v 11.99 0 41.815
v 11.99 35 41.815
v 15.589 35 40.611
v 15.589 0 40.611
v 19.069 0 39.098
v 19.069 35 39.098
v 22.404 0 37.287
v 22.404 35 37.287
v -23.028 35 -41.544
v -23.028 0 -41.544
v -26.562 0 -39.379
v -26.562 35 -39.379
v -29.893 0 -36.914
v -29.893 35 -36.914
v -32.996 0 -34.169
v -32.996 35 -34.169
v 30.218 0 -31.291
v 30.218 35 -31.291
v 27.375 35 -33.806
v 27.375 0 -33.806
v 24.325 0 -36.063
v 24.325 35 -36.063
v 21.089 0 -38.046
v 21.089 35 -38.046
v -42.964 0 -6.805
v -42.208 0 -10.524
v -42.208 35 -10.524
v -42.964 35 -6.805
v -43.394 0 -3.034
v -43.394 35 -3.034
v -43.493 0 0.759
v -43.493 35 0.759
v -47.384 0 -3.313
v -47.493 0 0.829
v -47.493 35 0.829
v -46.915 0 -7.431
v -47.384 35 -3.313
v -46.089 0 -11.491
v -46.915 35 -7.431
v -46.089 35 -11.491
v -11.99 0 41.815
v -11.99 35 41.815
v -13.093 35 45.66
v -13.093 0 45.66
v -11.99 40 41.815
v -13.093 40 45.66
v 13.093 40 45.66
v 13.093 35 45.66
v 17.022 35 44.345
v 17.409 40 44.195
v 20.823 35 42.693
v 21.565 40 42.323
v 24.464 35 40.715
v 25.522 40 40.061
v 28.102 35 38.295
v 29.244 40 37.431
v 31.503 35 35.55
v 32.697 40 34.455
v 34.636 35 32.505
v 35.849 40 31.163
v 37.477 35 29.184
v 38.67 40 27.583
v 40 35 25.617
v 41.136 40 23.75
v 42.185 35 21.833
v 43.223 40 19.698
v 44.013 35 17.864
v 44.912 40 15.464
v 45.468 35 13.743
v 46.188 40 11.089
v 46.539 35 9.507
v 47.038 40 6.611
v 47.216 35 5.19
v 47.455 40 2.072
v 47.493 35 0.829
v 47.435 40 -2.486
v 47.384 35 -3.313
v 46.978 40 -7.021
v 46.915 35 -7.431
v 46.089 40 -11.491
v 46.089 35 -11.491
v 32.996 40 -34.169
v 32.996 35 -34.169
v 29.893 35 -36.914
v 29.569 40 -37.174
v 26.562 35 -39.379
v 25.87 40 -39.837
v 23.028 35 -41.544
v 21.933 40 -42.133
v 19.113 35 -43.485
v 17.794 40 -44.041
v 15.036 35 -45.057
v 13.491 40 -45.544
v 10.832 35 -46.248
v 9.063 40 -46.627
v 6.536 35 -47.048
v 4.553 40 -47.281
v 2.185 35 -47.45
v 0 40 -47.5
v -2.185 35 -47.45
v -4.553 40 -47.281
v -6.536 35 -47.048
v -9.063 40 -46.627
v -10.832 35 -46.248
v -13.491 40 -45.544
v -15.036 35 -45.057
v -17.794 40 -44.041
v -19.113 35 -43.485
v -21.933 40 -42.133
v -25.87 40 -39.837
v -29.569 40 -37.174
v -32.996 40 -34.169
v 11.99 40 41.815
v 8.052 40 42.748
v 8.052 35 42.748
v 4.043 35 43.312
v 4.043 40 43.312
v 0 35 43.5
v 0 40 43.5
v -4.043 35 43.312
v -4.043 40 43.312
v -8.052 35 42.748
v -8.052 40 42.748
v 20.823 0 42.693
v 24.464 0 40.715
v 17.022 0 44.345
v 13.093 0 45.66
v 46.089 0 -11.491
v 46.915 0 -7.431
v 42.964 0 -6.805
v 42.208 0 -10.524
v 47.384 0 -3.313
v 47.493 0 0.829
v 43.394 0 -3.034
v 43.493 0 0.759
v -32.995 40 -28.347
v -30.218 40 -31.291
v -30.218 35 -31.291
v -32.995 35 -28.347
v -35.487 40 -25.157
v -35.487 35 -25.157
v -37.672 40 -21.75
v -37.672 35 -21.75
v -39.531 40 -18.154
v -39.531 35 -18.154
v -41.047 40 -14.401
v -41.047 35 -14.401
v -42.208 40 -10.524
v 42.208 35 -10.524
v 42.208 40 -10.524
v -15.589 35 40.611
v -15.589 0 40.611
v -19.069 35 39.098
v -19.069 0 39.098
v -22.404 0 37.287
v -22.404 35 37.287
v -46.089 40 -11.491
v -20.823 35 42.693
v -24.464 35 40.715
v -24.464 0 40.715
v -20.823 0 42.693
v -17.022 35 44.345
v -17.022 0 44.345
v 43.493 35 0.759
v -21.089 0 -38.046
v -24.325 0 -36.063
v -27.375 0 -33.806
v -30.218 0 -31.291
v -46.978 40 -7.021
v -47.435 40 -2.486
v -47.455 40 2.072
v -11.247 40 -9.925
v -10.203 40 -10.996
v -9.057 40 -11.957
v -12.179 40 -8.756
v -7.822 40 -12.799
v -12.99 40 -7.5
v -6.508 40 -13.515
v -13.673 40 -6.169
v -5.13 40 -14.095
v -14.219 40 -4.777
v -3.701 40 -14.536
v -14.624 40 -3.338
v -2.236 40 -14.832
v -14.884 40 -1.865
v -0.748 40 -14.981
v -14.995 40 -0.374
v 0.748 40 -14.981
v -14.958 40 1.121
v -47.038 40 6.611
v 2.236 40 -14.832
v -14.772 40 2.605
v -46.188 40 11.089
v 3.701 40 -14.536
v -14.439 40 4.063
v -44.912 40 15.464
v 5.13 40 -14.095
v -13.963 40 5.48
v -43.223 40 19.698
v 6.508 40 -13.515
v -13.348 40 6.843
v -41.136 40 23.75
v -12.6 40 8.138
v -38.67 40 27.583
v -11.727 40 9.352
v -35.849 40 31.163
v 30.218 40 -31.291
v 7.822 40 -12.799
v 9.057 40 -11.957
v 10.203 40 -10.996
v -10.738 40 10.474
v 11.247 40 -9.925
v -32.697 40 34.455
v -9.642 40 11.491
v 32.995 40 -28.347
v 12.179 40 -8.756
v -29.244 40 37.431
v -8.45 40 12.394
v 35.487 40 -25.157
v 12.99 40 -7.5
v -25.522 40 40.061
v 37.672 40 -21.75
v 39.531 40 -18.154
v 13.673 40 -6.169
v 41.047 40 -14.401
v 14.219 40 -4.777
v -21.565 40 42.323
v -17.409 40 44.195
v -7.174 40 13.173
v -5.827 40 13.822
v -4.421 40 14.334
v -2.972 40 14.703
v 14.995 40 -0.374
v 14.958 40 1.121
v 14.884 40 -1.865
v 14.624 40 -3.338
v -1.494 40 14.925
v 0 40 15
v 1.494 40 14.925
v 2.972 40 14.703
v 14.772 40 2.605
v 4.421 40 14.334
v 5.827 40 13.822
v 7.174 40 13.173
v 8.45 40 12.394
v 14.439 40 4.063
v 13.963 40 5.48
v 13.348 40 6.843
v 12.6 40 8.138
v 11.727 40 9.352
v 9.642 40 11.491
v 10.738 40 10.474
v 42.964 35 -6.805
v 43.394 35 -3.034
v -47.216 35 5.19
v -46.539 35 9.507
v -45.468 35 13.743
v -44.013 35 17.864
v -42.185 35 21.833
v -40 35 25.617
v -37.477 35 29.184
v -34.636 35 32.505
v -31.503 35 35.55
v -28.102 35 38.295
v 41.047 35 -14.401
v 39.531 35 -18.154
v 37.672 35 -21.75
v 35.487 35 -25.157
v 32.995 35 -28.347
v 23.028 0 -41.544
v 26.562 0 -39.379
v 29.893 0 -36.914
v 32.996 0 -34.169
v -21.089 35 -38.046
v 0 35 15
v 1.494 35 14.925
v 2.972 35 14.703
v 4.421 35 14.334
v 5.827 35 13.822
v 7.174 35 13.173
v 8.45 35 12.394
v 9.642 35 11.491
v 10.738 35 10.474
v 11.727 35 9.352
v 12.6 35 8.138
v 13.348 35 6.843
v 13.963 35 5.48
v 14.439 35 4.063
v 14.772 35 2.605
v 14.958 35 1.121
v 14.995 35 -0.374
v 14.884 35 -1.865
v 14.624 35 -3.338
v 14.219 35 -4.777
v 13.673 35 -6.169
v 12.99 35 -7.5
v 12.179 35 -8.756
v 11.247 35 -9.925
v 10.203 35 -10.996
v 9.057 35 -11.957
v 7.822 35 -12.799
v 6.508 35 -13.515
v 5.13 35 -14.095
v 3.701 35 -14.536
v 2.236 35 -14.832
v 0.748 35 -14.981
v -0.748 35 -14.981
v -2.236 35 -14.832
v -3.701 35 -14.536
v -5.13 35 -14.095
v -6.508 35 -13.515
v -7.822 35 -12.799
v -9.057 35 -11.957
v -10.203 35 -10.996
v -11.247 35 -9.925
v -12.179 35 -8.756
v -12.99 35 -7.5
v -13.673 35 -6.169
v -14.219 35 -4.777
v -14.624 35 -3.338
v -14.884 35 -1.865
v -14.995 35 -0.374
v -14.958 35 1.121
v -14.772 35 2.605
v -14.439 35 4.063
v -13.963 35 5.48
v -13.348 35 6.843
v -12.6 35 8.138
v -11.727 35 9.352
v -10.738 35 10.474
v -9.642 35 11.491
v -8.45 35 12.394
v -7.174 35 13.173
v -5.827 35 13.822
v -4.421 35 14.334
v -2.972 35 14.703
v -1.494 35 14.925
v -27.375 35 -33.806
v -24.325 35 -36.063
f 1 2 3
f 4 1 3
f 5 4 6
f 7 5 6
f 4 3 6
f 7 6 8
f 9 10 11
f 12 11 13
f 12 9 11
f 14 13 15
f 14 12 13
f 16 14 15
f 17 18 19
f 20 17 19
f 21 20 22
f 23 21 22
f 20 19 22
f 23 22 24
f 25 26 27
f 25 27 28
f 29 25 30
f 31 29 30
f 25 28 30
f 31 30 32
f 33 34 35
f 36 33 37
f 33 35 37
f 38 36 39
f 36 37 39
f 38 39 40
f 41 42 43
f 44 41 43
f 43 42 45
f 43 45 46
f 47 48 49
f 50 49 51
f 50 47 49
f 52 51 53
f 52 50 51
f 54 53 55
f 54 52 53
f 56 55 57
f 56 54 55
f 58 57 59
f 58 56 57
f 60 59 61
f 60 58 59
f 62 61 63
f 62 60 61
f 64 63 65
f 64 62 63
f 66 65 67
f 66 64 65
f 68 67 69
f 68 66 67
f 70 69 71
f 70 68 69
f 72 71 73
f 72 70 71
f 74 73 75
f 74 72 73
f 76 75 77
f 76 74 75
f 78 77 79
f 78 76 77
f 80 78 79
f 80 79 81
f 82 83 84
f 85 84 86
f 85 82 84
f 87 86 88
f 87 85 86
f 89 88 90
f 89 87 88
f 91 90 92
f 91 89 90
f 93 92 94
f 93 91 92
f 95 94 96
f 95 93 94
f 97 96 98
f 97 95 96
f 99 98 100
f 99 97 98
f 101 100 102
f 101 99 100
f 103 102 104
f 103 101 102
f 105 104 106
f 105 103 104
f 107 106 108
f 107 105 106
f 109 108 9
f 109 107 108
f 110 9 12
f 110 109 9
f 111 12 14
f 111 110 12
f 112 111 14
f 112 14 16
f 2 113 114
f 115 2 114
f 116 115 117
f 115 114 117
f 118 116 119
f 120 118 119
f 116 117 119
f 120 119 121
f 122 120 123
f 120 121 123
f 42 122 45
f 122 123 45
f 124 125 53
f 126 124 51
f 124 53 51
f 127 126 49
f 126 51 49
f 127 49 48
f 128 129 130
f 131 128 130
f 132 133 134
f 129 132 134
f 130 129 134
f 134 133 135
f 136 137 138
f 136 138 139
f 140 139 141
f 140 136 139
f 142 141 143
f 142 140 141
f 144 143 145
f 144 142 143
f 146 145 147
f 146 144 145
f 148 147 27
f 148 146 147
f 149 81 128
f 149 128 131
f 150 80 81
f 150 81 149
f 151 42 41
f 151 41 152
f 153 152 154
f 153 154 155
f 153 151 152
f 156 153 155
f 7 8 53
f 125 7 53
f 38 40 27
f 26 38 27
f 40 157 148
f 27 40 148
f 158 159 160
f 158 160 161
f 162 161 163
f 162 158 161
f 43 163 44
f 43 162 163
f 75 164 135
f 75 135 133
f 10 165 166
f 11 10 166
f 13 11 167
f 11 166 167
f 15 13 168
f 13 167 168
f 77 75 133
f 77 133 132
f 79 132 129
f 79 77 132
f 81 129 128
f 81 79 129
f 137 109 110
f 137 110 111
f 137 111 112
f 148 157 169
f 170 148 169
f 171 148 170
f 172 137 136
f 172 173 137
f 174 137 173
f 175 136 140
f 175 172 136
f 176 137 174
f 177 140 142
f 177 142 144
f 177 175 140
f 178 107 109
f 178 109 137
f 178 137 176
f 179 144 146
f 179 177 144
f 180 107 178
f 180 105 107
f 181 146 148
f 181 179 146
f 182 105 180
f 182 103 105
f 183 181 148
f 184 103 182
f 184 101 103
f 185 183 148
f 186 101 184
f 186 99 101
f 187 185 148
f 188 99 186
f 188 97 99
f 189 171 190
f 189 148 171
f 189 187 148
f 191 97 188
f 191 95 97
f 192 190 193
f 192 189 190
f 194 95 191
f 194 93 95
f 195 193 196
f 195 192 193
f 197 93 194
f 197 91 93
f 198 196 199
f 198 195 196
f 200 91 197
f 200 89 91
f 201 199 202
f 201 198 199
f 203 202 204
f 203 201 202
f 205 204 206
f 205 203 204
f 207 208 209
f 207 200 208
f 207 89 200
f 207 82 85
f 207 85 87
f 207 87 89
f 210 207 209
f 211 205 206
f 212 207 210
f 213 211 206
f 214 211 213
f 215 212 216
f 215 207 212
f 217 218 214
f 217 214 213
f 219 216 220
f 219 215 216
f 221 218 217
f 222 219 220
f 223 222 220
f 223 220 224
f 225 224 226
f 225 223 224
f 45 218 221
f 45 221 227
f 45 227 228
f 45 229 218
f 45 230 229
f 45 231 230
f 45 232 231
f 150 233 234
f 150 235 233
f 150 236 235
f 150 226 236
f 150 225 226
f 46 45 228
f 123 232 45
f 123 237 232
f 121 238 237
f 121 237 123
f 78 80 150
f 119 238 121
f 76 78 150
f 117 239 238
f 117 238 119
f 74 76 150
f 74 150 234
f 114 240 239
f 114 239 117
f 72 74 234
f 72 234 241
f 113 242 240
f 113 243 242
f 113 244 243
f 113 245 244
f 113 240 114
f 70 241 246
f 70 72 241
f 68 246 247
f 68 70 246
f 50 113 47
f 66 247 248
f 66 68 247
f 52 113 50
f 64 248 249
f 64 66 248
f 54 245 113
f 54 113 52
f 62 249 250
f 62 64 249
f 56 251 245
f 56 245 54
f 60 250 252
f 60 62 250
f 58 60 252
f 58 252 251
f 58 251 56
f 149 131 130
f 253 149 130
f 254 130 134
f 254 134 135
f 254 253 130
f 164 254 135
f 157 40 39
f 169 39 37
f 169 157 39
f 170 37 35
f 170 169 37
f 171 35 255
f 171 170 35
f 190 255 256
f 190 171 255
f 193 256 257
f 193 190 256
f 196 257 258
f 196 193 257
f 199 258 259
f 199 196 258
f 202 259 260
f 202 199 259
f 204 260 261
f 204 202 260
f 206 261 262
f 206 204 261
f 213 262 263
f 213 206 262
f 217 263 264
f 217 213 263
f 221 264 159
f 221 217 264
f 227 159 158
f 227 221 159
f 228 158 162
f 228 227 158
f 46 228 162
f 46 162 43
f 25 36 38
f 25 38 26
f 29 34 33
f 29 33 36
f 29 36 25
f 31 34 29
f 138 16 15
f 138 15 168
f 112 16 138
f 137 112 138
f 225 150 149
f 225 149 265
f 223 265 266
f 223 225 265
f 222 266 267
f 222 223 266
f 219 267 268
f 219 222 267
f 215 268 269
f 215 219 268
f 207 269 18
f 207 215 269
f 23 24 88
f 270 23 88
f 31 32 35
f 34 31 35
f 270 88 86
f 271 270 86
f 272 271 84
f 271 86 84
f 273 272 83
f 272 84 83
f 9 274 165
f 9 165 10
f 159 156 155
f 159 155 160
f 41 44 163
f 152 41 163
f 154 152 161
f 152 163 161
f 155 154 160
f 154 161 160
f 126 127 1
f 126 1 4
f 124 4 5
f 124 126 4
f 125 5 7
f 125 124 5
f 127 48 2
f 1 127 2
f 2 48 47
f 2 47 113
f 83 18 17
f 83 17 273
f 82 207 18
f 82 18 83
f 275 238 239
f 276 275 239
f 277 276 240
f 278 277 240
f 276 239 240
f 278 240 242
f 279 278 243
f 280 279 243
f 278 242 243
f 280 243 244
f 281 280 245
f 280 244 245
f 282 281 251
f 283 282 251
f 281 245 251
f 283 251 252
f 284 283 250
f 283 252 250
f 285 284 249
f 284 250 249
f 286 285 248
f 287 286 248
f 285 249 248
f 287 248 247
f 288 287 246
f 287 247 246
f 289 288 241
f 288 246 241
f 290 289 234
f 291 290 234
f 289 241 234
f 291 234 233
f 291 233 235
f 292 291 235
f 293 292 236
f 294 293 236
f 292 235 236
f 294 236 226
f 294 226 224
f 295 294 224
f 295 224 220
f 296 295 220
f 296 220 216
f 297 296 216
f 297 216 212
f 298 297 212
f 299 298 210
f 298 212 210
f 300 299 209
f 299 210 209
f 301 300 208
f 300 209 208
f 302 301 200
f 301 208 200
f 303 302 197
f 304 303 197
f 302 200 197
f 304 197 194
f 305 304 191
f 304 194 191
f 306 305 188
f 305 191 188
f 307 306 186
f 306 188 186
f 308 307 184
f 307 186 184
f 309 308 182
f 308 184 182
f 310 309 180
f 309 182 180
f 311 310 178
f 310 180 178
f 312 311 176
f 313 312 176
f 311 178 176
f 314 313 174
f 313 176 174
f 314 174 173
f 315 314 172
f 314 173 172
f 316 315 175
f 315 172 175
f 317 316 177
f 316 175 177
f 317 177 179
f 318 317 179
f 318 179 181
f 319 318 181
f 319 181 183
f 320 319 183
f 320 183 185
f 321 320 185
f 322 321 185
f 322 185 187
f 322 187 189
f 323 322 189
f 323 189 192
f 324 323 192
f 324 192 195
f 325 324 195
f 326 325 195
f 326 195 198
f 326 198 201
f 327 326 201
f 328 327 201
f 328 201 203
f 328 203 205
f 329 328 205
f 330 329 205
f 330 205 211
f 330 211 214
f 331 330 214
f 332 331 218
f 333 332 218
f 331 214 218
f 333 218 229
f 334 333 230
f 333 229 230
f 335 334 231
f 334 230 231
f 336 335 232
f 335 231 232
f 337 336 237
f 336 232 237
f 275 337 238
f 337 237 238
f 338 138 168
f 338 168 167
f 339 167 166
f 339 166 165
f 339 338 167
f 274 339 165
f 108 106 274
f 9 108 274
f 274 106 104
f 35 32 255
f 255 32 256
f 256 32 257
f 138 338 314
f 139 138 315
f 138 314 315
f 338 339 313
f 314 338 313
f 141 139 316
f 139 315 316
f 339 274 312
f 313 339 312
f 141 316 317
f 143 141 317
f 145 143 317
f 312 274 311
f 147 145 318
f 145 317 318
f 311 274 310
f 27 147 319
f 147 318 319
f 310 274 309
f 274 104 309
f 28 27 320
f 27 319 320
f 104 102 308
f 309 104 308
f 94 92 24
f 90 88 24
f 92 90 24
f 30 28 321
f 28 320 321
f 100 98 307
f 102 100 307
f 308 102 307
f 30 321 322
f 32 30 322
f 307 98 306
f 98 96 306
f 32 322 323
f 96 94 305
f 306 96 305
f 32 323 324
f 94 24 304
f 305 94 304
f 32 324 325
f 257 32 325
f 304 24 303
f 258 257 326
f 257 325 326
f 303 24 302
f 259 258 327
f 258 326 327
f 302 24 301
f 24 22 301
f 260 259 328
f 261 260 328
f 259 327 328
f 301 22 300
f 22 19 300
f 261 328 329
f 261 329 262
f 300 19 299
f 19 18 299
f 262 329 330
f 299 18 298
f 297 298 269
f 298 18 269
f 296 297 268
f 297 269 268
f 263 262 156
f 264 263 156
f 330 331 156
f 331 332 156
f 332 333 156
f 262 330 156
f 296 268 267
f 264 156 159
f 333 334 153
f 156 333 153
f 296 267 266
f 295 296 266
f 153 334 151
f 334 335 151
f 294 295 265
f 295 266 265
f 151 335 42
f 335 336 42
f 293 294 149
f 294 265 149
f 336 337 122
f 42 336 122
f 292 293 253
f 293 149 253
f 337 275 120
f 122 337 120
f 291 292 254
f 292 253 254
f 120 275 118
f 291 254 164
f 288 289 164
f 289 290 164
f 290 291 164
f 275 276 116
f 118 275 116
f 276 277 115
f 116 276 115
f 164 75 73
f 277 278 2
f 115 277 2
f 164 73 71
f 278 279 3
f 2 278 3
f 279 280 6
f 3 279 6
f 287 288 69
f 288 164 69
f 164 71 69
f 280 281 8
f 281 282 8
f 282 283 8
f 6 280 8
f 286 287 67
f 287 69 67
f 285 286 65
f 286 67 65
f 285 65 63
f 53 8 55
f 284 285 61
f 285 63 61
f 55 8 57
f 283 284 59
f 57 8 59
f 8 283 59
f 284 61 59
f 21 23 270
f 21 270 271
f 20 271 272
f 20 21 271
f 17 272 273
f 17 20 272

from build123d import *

# Parameters (mm, degrees)
CROQUIS2_R              = 47.5
CROQUIS2_R_2            = 15
SALIENTE_EXTRUIR1_DEPTH = 5
CORTAR_EXTRUIR1_START   = -5
CORTAR_EXTRUIR1_DEPTH   = 5
SALIENTE_EXTRUIR2_DEPTH = 35


with BuildPart() as part:
    # Croquis2 → Saliente-Extruir1 (new body)
    with BuildSketch(Plane(origin=(0, 40, 0), x_dir=(1, 0, 0), z_dir=(0, 1, 0))):
        with Locations(Location((0, 0, 0), (0, 0, 270))):
            Circle(CROQUIS2_R)
        with Locations(Location((0, 0, 0), (0, 0, 270))):
            Circle(CROQUIS2_R_2, mode=Mode.SUBTRACT)
    extrude(amount=-SALIENTE_EXTRUIR1_DEPTH)

    # Croquis3 → Cortar-Extruir1 (cut)
    with BuildSketch(Plane.XZ.offset(-35).offset(CORTAR_EXTRUIR1_START)):
        with BuildLine():
            Line((-11.990224978, 41.814883773), (-13.092774401, 45.659930557))
            ThreePointArc((-13.092774401, 45.659930557), (0, 47.5), (13.092774401, 45.659930557))
            Line((13.092774401, 45.659930557), (11.990224978, 41.814883773))
            ThreePointArc((11.990224978, 41.814883773), (0, 43.5), (-11.990224978, 41.814883773))
        make_face()
        with BuildLine():
            Line((30.217639115, -31.291281315), (32.996272597, -34.168640516))
            ThreePointArc((32.996272597, -34.168640516), (41.13620668, -23.75), (46.089046998, -11.491290041))
            Line((46.089046998, -11.491290041), (42.207864093, -10.523602459))
            ThreePointArc((42.207864093, -10.523602459), (37.672105065, -21.75), (30.217639115, -31.291281315))
        make_face()
        with BuildLine():
            Line((-42.207864093, -10.523602459), (-46.089046998, -11.491290041))
            ThreePointArc((-46.089046998, -11.491290041), (-41.13620668, -23.75), (-32.996272597, -34.168640516))
            Line((-32.996272597, -34.168640516), (-30.217639115, -31.291281315))
            ThreePointArc((-30.217639115, -31.291281315), (-37.672105065, -21.75), (-42.207864093, -10.523602459))
        make_face()
    extrude(amount=CORTAR_EXTRUIR1_DEPTH, mode=Mode.SUBTRACT)

    # Croquis4 → Saliente-Extruir2 (add)
    with BuildSketch(Plane.XZ.offset(-35)):
        with BuildLine():
            Line((-43.493374739, 0.75917968), (-47.49276552, 0.828989306))
            ThreePointArc((-47.49276552, 0.828989306), (-47.194663145, -5.377152654), (-46.089046998, -11.491290041))
            Line((-46.089046998, -11.491290041), (-42.207864093, -10.523602459))
            ThreePointArc((-42.207864093, -10.523602459), (-43.220375722, -4.924339799), (-43.493374739, 0.75917968))
        make_face()
        with BuildLine():
            Line((-22.404156259, 37.286777581), (-24.464308558, 40.715446783))
            ThreePointArc((-24.464308558, 40.715446783), (-18.940580774, 43.560353533), (-13.092774401, 45.659930557))
            Line((-13.092774401, 45.659930557), (-11.990224978, 41.814883773))
            ThreePointArc((-11.990224978, 41.814883773), (-17.345584498, 39.892113236), (-22.404156259, 37.286777581))
        make_face()
        with BuildLine():
            Line((43.493374739, 0.75917968), (47.49276552, 0.828989306))
            ThreePointArc((47.49276552, 0.828989306), (47.194663145, -5.377152654), (46.089046998, -11.491290041))
            Line((46.089046998, -11.491290041), (42.207864093, -10.523602459))
            ThreePointArc((42.207864093, -10.523602459), (43.220375722, -4.924339799), (43.493374739, 0.75917968))
        make_face()
        with BuildLine():
            Line((22.404156259, 37.286777581), (24.464308558, 40.715446783))
            ThreePointArc((24.464308558, 40.715446783), (18.940580774, 43.560353533), (13.092774401, 45.659930557))
            Line((13.092774401, 45.659930557), (11.990224978, 41.814883773))
            ThreePointArc((11.990224978, 41.814883773), (17.345584498, 39.892113236), (22.404156259, 37.286777581))
        make_face()
        with BuildLine():
            Line((-21.089218481, -38.045957261), (-23.028456962, -41.544436089))
            ThreePointArc((-23.028456962, -41.544436089), (-28.254082371, -38.183200879), (-32.996272597, -34.168640516))
            Line((-32.996272597, -34.168640516), (-30.217639115, -31.291281315))
            ThreePointArc((-30.217639115, -31.291281315), (-25.874791224, -34.967773437), (-21.089218481, -38.045957261))
        make_face()
        with BuildLine():
            Line((21.089218481, -38.045957261), (23.028456962, -41.544436089))
            ThreePointArc((23.028456962, -41.544436089), (28.254082371, -38.183200879), (32.996272597, -34.168640516))
            Line((32.996272597, -34.168640516), (30.217639115, -31.291281315))
            ThreePointArc((30.217639115, -31.291281315), (25.874791224, -34.967773437), (21.089218481, -38.045957261))
        make_face()
    extrude(amount=SALIENTE_EXTRUIR2_DEPTH)


solid = part.part
